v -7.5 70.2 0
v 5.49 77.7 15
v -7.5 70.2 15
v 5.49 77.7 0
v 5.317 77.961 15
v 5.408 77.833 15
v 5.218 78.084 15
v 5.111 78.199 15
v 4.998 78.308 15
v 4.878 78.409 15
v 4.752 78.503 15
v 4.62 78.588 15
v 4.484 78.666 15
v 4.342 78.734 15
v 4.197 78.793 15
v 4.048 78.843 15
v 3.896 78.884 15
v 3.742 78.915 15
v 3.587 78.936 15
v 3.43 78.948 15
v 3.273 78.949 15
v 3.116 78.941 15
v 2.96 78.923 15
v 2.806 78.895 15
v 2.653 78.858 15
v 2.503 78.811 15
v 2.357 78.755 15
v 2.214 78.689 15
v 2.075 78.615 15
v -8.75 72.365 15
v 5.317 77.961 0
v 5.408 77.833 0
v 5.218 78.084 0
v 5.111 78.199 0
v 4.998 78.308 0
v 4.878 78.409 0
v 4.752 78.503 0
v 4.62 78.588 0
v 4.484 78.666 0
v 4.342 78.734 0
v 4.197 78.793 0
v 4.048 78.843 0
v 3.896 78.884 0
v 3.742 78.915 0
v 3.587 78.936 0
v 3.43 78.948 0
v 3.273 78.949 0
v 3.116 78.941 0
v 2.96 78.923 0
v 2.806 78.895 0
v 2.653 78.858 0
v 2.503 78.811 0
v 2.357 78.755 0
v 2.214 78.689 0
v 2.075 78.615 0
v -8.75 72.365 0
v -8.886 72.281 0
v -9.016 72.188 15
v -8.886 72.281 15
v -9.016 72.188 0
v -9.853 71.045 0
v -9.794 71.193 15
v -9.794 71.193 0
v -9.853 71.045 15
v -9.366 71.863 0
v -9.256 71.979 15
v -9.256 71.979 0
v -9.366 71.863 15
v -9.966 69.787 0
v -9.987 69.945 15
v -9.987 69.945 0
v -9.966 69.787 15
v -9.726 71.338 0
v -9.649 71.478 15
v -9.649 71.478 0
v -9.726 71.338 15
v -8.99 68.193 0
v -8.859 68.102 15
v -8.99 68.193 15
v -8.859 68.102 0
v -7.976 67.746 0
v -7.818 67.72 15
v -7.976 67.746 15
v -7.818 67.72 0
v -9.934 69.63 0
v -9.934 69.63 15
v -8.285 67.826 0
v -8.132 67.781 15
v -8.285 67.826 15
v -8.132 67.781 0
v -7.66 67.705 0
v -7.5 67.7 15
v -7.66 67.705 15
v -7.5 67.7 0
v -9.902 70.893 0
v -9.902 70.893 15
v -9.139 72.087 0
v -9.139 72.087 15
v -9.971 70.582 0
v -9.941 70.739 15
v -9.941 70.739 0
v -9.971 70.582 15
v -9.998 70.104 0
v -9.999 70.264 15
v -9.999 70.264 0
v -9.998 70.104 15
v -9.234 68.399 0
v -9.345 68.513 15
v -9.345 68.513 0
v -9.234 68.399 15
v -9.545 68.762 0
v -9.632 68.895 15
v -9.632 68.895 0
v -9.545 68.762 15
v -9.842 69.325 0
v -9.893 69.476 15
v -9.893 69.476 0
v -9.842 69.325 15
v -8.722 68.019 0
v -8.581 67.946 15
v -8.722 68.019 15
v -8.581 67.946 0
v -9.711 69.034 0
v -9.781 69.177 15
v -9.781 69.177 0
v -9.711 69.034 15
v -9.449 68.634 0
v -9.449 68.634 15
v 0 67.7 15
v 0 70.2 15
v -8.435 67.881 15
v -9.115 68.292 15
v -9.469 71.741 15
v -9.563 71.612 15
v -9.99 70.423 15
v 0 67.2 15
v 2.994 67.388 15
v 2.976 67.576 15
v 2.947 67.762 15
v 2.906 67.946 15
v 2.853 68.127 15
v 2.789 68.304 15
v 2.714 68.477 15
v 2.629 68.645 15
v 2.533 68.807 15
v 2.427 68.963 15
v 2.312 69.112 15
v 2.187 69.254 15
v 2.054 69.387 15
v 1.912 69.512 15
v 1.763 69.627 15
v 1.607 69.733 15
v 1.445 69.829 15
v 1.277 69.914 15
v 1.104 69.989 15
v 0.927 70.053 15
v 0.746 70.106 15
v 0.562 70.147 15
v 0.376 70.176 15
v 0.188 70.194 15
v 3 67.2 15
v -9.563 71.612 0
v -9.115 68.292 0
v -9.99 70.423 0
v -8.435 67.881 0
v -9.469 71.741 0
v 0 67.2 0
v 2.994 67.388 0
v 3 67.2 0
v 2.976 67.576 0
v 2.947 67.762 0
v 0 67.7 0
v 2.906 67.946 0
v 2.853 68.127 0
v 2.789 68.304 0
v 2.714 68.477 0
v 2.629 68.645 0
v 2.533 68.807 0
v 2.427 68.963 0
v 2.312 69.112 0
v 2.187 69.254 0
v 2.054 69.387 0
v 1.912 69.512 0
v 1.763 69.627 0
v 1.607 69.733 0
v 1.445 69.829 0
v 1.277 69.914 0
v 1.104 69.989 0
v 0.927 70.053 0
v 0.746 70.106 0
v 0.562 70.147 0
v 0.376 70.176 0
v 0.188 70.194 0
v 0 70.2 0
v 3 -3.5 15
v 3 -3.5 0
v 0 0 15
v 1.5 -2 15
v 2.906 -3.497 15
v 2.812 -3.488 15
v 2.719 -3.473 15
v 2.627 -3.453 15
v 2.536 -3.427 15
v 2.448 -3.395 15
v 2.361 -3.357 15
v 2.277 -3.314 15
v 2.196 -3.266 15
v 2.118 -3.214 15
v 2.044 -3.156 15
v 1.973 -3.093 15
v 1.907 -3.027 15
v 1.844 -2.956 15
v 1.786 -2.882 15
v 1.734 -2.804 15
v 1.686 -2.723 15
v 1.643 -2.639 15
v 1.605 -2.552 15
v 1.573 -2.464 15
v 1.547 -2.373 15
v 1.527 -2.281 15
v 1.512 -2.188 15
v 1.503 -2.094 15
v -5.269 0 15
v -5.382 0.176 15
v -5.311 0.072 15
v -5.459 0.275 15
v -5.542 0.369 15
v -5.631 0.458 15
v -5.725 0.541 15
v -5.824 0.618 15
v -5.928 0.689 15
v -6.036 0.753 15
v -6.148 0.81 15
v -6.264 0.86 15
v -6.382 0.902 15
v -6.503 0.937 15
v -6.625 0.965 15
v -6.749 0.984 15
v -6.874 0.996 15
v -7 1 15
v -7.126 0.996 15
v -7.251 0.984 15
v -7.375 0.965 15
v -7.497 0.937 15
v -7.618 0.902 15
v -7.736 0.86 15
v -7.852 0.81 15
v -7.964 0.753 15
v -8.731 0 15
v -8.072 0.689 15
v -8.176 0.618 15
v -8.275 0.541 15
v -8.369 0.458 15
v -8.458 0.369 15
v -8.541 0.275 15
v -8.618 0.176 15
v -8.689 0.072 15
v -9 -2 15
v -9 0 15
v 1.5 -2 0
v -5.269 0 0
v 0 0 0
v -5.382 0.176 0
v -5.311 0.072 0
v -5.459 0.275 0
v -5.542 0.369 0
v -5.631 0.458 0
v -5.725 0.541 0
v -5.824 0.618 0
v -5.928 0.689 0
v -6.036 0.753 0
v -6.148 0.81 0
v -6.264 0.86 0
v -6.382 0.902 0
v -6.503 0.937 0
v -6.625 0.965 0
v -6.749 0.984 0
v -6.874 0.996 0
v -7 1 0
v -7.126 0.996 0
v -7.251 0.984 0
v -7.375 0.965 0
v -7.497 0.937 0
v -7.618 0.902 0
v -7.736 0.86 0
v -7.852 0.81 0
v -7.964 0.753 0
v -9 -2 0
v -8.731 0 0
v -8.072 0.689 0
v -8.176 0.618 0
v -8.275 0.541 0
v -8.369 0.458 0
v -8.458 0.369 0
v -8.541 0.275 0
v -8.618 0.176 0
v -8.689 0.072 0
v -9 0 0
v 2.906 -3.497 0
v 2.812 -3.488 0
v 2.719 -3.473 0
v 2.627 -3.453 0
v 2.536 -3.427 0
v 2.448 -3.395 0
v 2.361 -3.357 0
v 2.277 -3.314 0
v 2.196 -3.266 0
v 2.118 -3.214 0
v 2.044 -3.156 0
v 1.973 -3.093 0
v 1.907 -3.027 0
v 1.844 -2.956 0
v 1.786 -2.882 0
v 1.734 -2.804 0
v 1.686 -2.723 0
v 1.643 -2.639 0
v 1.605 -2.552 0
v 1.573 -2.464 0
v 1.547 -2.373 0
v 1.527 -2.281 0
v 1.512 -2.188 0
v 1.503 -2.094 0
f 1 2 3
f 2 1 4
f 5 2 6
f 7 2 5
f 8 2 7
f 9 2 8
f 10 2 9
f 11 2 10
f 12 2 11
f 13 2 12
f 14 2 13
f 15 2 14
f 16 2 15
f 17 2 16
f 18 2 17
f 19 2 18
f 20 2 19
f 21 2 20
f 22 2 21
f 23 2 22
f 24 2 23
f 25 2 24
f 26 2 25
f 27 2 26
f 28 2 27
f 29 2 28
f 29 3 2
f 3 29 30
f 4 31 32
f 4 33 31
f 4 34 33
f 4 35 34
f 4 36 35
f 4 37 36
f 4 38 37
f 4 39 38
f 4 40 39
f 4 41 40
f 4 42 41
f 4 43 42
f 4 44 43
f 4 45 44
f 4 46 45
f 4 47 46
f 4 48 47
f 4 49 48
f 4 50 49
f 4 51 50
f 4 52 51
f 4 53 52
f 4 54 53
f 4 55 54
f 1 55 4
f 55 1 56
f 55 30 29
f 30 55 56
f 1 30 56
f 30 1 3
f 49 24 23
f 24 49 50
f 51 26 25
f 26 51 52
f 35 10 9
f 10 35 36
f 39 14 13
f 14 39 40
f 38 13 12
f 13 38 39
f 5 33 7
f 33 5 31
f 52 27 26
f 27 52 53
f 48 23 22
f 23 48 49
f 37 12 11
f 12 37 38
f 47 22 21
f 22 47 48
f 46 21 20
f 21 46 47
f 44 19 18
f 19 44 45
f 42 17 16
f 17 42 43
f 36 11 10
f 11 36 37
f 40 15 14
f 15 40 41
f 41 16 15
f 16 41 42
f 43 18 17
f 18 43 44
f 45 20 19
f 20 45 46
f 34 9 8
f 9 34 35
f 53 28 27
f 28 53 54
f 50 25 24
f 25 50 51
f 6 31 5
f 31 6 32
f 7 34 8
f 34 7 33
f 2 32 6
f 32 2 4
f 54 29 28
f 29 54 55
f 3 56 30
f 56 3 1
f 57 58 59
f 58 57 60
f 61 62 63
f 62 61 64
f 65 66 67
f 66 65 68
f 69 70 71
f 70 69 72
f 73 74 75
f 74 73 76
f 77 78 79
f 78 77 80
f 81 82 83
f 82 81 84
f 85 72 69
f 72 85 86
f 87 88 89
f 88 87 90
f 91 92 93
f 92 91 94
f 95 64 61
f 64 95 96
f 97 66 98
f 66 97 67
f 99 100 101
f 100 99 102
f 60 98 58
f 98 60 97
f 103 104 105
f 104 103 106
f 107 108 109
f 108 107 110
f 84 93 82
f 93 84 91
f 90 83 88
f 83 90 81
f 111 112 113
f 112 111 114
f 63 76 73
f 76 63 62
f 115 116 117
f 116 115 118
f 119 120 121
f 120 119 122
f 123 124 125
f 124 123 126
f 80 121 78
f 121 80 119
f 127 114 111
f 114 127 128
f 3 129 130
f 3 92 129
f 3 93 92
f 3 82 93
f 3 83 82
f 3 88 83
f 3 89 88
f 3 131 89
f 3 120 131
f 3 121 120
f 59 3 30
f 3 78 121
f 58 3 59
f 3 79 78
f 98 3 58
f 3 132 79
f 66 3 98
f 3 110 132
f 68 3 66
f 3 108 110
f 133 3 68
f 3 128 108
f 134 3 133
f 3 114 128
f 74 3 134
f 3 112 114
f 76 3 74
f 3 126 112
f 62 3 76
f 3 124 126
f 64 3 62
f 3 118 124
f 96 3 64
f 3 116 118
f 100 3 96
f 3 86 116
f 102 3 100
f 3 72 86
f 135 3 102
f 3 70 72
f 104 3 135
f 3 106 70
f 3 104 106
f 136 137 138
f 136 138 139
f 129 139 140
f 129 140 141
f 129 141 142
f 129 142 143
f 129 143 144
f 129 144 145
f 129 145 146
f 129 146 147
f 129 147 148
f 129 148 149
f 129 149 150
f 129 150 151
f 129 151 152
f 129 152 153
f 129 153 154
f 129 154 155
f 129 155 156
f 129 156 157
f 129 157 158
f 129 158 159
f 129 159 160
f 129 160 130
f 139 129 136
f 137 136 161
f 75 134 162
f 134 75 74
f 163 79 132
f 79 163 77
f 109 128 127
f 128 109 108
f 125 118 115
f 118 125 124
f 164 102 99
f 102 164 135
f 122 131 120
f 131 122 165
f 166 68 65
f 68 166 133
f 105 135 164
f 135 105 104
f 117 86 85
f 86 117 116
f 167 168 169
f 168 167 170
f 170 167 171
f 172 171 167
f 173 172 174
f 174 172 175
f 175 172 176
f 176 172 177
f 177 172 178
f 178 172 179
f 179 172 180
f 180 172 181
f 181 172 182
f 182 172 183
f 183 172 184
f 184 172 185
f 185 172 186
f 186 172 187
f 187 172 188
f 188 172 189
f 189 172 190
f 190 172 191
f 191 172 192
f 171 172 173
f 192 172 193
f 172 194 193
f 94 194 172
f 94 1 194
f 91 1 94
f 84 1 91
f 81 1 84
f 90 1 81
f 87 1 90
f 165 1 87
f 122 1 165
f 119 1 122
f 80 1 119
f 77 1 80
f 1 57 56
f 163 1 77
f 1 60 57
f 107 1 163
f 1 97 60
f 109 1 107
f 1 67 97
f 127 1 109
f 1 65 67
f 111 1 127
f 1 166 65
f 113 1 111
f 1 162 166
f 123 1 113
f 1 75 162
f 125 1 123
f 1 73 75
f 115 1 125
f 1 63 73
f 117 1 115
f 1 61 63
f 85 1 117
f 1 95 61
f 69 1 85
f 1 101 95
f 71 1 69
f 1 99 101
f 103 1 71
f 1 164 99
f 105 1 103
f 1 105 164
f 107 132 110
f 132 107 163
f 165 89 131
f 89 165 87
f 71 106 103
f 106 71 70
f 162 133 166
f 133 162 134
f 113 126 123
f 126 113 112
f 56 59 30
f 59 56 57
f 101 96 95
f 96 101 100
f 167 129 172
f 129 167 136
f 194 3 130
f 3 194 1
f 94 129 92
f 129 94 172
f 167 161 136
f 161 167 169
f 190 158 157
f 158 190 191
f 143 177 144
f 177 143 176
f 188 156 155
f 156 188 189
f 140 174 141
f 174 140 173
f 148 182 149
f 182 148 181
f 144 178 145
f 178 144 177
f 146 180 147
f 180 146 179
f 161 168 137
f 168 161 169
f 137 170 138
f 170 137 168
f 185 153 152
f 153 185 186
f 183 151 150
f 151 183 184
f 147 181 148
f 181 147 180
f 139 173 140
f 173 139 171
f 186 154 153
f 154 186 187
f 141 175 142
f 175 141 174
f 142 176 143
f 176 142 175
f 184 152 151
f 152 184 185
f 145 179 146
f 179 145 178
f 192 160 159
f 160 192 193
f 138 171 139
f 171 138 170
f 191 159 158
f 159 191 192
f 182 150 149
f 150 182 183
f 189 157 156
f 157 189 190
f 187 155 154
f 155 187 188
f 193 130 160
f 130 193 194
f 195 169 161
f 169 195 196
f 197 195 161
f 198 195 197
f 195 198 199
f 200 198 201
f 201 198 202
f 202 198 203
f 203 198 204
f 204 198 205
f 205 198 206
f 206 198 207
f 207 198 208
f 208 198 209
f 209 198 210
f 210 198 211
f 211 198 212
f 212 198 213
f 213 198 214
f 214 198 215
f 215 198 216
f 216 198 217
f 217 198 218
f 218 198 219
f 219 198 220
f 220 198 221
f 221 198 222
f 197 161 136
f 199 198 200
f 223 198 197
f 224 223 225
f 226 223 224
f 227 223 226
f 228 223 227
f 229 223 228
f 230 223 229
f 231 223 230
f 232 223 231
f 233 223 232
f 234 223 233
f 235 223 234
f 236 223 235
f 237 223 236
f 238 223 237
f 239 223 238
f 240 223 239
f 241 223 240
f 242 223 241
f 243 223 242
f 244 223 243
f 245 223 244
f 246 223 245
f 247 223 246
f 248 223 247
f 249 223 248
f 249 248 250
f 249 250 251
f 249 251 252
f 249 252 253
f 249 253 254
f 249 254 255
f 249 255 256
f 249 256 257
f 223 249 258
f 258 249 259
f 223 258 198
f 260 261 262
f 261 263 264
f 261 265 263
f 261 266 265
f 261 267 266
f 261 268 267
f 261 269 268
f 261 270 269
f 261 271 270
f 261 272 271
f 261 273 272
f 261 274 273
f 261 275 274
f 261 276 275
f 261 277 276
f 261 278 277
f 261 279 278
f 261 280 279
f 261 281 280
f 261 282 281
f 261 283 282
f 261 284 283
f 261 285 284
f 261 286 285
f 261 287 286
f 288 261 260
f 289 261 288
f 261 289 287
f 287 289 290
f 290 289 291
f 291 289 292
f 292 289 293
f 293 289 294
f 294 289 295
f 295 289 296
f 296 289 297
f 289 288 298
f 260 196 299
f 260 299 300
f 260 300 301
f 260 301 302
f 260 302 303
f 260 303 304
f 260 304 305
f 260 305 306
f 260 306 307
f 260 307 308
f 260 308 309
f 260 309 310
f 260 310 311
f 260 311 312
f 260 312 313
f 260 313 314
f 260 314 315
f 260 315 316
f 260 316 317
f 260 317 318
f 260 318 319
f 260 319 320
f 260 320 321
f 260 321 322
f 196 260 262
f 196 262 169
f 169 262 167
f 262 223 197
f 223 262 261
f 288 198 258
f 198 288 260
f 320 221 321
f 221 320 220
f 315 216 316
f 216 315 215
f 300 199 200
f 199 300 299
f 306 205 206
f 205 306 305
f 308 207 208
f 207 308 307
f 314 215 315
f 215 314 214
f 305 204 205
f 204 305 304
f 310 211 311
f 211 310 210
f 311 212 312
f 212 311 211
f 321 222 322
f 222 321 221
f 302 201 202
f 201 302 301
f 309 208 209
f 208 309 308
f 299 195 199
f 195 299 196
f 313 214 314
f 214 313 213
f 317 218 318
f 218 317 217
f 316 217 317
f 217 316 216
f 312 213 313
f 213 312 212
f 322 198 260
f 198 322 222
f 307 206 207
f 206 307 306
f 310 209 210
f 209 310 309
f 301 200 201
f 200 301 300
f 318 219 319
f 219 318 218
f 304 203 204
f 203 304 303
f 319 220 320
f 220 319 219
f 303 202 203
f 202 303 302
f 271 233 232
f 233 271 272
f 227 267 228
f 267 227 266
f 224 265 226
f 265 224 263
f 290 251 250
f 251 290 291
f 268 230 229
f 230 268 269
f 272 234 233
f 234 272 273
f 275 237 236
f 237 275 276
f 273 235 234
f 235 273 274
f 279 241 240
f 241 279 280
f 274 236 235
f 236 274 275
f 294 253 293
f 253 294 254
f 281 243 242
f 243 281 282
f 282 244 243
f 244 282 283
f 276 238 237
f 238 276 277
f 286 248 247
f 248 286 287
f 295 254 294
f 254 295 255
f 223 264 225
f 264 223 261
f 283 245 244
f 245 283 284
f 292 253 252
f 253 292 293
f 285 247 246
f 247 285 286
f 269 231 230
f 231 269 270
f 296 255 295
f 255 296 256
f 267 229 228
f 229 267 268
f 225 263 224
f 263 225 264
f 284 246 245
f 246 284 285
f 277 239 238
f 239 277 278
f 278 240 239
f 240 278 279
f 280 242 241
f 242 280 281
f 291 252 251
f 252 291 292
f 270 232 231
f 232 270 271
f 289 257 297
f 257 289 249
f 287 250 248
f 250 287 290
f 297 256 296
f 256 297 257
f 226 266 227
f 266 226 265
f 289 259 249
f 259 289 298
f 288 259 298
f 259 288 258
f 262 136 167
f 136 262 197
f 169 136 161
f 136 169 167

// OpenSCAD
/* [Hook base] */
// Tickness of the main body
hook_tickness = 3;

// Width of the hook
hook_width = 15;

// Distance between top and bottom hook attachment 
base_height = 67.2;

/* [Top attachment] */
// 
top_hook_depth = 10;

// 
top_hook_height = 17.5;

// Tickness of the top attachment
top_hook_tickness = 2.5;

top_hook_bottom_angle = 90; // [90:90]
top_hook_back_angle = 30; // [30:180]

/* [Bottom attachment] */
// Generate bottom attachment
bottom_hook = true;
bottom_hook_tickness = 2;
bottom_hook_depth = 9;

/* [Accessory Type] */
accessory_type = "None"; // [None, Cleat, J-Hook]

/* [Cleat Options] */
cleat_height = 15;
cleat_depth = 10;
cleat_position = 40;

/* [J-Hook Options] */
jhook_tickness = 3; //
jhook_inner_radius = 10; //
jhook_angle = 180; // [100:200]
// J-hook position on the base. At 0, the bottom of the j-hook will be at the same height as the bottom of the hook.
jhook_position = 0; //

/* [Hidden] */
$fn = 60;

has_cleat = accessory_type == "Cleat";
has_jhook = accessory_type == "J-Hook";

hook_base();

module hook_base() {
    
    top_hook_depth = top_hook_depth - (top_hook_tickness);
    top_hook_height = top_hook_height - (top_hook_tickness*2);
    base(width = hook_width, height = base_height);

    translate([0,base_height - max(hook_tickness, top_hook_tickness),0]) {
        top_attachment();
    }
    
    if (bottom_hook) {
        bottom_attachment();
    }
    
    if (has_cleat) {
        translate([0,cleat_position,0]) {
            cleat();
        }
    } else if (has_jhook) {
        translate([0,jhook_position - (bottom_hook ? bottom_hook_tickness: 0) ,0]) {
            j_hook();
        }
    }
    
    module top_attachment() {
        union() {
            translate([0,hook_tickness,0]) {
                slice(r = hook_tickness, h = hook_width , d = top_hook_bottom_angle);
            }
            
            rotate([0,0,top_hook_bottom_angle - 90]) {
                translate([-top_hook_depth,hook_tickness + (hook_tickness - top_hook_tickness), 0]) {
                    cube([top_hook_depth, top_hook_tickness, hook_width]);
                    translate([0,top_hook_tickness,0]) {
                        rotate([0,0,top_hook_back_angle + 90]) {
                            slice(r = top_hook_tickness, h = hook_width, d = 180 - top_hook_back_angle);
                        }
                        rotate([0,0,top_hook_back_angle - 90]) {
                            translate([-top_hook_tickness,0,0]) {
                                cube([top_hook_tickness,top_hook_height,hook_width]);
                            }
                            translate([0,top_hook_height,0]) {
                                rotate([0,0,90])
                                slice(r = top_hook_tickness, h = hook_width, d = 90);
                            }
                        }
                        
                    }
                }
            }            
        }
    }
    
    module bottom_attachment() {
        translate([0,-2,0]) {
            cube([hook_tickness,2,hook_width]);
            translate([hook_tickness,0,0])
            rotate([0,0,-180]) {
                slice(r = hook_tickness/2, h = hook_width, d = 90);
            }
        }
        rotate([0,0,-90]) {
            translate([0,-bottom_hook_depth,0]) {
                cube([bottom_hook_tickness, bottom_hook_depth, hook_width]);
                rotate([0,0,90]) {
                    translate([2,-1,0]) {
                        difference() {
                            slice(r = 2, h = hook_width, d = 180);
                            translate([-2,0,0]) {
                                cube([4,1,hook_width]);
                            }
                        }
                    }
                }
            }
        }
    }
}

module base(tickness = hook_tickness, height = 50, width = 15) {
    union() {
        cube([tickness, height, width ]);
        children();
    }
}

/* Accessories */
module cleat(width = 15, hole = false) {
    tolerance = hole ? 0.5 : 0;
    cleat_height = cleat_height  + tolerance + 0.8;
    cleat_depth = cleat_depth + tolerance;
    hook_tickness = hook_tickness + tolerance;
    width = width + tolerance;
    
    difference() {
        union() {
            cube([cleat_depth, cleat_height, width]);
            if (hole) {
                translate([0,-(cleat_height/2),0]) {
                    cube([cleat_depth, cleat_height, width ]);
                }
            }
                
        }
        translate([-1,cleat_height - cleat_depth,0]) {
            rotate([0,0,45]) {
                cube([cleat_depth * 2,cleat_depth,width]);
            }
        }
        if (!hole) {
            translate([cleat_depth,-cleat_depth,0]) {
                rotate([0,0,45]) {
                    translate([-cleat_depth,0,0])
                        cube([cleat_depth * 2,cleat_depth,width]);
                }
            }
        }
    }
    
    translate([1,-1,0]) {
        rotate([0,0,90]) {
            difference() {
                cube([1,1, width]);
                cylinder(r = 1, h = width);
            }
        }
    }
}

module j_hook() {
	jhook_center = jhook_inner_radius + jhook_tickness;
	
	translate([hook_tickness - jhook_tickness,0,0]) {
		difference() {
			union() {
				cube([jhook_center,jhook_center,hook_width]);
		
				translate([jhook_center,jhook_center,0]) {	
				rotate ([0,0,-90])	
					slice(r = jhook_center, h = hook_width, d = jhook_angle - 90);
			
					rotate([0,0,jhook_angle - 180])
					translate([jhook_tickness/2 + jhook_inner_radius ,0,0]) {
						slice(r = jhook_tickness/2, h=15);
					}
				}
			}
			translate([jhook_center,jhook_center,0]) {
				cylinder(r = jhook_inner_radius, h = hook_width);
			}
		}
	}
}

/* Helpers */

// Generates a slice of a cylinder with an angle
module slice(r = 10, h = 10, d = 180, center = false) {
    translate([0,0,(center ? -h/2 : 0)]) {
        rotate_extrude(angle = d, $fn=100) {
            square([r,h]);
        }
    }
}
